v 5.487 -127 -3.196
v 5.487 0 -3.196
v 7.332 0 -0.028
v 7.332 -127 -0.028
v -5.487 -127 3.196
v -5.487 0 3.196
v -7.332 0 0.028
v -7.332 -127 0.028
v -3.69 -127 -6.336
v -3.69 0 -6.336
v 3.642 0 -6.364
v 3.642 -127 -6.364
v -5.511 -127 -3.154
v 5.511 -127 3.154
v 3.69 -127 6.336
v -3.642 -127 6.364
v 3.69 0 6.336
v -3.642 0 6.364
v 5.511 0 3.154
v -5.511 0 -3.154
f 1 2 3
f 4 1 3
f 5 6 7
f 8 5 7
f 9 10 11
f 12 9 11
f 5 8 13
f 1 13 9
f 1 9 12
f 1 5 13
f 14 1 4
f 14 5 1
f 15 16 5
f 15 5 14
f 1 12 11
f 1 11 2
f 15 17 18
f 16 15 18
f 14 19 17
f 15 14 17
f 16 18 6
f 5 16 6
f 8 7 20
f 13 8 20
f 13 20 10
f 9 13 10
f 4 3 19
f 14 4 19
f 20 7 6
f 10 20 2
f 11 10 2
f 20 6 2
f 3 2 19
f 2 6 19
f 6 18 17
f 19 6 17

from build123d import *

# Parameters (mm, degrees)
F1_DEPTH = 127


with BuildPart() as f1:
    # F0 (on Front) → F1 (new body)
    with BuildSketch(Plane.XZ):
        with BuildLine():
            ThreePointArc((5.4872727498, -3.1956748535), (6.130525343, -1.6550404888), (6.35, 0))
            ThreePointArc((6.35, 0), (6.136710925, 1.6319555825), (5.5111719612, 3.1542802054))
            ThreePointArc((5.5111719612, 3.1542802054), (3.1956748226, 5.4872727678), (0.0238991973, 6.3499550257))
            ThreePointArc((0.0238991973, 6.3499550257), (-3.1542802223, 5.5111719515), (-5.4872727914, 3.195674782))
            ThreePointArc((-5.4872727914, 3.195674782), (-6.3499550258, 0.0238991699), (-5.5111719612, -3.1542802054))
            ThreePointArc((-5.5111719612, -3.1542802054), (-3.1956748226, -5.4872727678), (-0.0238991973, -6.3499550257))
            ThreePointArc((-0.0238991973, -6.3499550257), (3.1542801864, -5.511171972), (5.4872727498, -3.1956748535))
        make_face()
        with BuildLine():
            ThreePointArc((5.5111719612, 3.1542802054), (6.136710925, 1.6319555825), (6.35, 0))
            ThreePointArc((6.35, 0), (6.130525343, -1.6550404888), (5.4872727498, -3.1956748535))
            Line((5.4872727498, -3.1956748535), (7.3322964871, -0.027596355))
            Line((7.3322964871, -0.027596355), (5.5111719612, 3.1542802054))
        make_face()
        with BuildLine():
            ThreePointArc((0.0238991973, 6.3499550257), (3.1956748226, 5.4872727678), (5.5111719612, 3.1542802054))
            Line((5.5111719612, 3.1542802054), (3.690047388, 6.3361568484))
            Line((3.690047388, 6.3361568484), (0.0238991973, 6.3499550257))
        make_face()
        with BuildLine():
            Line((3.6422490991, -6.3637532034), (5.4872727498, -3.1956748535))
            ThreePointArc((5.4872727498, -3.1956748535), (3.1542801864, -5.511171972), (-0.0238991973, -6.3499550257))
            Line((-0.0238991973, -6.3499550257), (3.6422490991, -6.3637532034))
        make_face()
        with BuildLine():
            ThreePointArc((-5.4872727914, 3.195674782), (-3.1542802223, 5.5111719515), (0.0238991973, 6.3499550257))
            Line((0.0238991973, 6.3499550257), (-3.6422490991, 6.3637532034))
            Line((-3.6422490991, 6.3637532034), (-5.4872727914, 3.195674782))
        make_face()
        with BuildLine():
            Line((-3.690047388, -6.3361568484), (-0.0238991973, -6.3499550257))
            ThreePointArc((-0.0238991973, -6.3499550257), (-3.1956748226, -5.4872727678), (-5.5111719612, -3.1542802054))
            Line((-5.5111719612, -3.1542802054), (-3.690047388, -6.3361568484))
        make_face()
        with BuildLine():
            ThreePointArc((-5.5111719612, -3.1542802054), (-6.3499550258, 0.0238991699), (-5.4872727914, 3.195674782))
            Line((-5.4872727914, 3.195674782), (-7.3322964871, 0.027596355))
            Line((-7.3322964871, 0.027596355), (-5.5111719612, -3.1542802054))
        make_face()
    extrude(amount=F1_DEPTH)


solid = f1.part
